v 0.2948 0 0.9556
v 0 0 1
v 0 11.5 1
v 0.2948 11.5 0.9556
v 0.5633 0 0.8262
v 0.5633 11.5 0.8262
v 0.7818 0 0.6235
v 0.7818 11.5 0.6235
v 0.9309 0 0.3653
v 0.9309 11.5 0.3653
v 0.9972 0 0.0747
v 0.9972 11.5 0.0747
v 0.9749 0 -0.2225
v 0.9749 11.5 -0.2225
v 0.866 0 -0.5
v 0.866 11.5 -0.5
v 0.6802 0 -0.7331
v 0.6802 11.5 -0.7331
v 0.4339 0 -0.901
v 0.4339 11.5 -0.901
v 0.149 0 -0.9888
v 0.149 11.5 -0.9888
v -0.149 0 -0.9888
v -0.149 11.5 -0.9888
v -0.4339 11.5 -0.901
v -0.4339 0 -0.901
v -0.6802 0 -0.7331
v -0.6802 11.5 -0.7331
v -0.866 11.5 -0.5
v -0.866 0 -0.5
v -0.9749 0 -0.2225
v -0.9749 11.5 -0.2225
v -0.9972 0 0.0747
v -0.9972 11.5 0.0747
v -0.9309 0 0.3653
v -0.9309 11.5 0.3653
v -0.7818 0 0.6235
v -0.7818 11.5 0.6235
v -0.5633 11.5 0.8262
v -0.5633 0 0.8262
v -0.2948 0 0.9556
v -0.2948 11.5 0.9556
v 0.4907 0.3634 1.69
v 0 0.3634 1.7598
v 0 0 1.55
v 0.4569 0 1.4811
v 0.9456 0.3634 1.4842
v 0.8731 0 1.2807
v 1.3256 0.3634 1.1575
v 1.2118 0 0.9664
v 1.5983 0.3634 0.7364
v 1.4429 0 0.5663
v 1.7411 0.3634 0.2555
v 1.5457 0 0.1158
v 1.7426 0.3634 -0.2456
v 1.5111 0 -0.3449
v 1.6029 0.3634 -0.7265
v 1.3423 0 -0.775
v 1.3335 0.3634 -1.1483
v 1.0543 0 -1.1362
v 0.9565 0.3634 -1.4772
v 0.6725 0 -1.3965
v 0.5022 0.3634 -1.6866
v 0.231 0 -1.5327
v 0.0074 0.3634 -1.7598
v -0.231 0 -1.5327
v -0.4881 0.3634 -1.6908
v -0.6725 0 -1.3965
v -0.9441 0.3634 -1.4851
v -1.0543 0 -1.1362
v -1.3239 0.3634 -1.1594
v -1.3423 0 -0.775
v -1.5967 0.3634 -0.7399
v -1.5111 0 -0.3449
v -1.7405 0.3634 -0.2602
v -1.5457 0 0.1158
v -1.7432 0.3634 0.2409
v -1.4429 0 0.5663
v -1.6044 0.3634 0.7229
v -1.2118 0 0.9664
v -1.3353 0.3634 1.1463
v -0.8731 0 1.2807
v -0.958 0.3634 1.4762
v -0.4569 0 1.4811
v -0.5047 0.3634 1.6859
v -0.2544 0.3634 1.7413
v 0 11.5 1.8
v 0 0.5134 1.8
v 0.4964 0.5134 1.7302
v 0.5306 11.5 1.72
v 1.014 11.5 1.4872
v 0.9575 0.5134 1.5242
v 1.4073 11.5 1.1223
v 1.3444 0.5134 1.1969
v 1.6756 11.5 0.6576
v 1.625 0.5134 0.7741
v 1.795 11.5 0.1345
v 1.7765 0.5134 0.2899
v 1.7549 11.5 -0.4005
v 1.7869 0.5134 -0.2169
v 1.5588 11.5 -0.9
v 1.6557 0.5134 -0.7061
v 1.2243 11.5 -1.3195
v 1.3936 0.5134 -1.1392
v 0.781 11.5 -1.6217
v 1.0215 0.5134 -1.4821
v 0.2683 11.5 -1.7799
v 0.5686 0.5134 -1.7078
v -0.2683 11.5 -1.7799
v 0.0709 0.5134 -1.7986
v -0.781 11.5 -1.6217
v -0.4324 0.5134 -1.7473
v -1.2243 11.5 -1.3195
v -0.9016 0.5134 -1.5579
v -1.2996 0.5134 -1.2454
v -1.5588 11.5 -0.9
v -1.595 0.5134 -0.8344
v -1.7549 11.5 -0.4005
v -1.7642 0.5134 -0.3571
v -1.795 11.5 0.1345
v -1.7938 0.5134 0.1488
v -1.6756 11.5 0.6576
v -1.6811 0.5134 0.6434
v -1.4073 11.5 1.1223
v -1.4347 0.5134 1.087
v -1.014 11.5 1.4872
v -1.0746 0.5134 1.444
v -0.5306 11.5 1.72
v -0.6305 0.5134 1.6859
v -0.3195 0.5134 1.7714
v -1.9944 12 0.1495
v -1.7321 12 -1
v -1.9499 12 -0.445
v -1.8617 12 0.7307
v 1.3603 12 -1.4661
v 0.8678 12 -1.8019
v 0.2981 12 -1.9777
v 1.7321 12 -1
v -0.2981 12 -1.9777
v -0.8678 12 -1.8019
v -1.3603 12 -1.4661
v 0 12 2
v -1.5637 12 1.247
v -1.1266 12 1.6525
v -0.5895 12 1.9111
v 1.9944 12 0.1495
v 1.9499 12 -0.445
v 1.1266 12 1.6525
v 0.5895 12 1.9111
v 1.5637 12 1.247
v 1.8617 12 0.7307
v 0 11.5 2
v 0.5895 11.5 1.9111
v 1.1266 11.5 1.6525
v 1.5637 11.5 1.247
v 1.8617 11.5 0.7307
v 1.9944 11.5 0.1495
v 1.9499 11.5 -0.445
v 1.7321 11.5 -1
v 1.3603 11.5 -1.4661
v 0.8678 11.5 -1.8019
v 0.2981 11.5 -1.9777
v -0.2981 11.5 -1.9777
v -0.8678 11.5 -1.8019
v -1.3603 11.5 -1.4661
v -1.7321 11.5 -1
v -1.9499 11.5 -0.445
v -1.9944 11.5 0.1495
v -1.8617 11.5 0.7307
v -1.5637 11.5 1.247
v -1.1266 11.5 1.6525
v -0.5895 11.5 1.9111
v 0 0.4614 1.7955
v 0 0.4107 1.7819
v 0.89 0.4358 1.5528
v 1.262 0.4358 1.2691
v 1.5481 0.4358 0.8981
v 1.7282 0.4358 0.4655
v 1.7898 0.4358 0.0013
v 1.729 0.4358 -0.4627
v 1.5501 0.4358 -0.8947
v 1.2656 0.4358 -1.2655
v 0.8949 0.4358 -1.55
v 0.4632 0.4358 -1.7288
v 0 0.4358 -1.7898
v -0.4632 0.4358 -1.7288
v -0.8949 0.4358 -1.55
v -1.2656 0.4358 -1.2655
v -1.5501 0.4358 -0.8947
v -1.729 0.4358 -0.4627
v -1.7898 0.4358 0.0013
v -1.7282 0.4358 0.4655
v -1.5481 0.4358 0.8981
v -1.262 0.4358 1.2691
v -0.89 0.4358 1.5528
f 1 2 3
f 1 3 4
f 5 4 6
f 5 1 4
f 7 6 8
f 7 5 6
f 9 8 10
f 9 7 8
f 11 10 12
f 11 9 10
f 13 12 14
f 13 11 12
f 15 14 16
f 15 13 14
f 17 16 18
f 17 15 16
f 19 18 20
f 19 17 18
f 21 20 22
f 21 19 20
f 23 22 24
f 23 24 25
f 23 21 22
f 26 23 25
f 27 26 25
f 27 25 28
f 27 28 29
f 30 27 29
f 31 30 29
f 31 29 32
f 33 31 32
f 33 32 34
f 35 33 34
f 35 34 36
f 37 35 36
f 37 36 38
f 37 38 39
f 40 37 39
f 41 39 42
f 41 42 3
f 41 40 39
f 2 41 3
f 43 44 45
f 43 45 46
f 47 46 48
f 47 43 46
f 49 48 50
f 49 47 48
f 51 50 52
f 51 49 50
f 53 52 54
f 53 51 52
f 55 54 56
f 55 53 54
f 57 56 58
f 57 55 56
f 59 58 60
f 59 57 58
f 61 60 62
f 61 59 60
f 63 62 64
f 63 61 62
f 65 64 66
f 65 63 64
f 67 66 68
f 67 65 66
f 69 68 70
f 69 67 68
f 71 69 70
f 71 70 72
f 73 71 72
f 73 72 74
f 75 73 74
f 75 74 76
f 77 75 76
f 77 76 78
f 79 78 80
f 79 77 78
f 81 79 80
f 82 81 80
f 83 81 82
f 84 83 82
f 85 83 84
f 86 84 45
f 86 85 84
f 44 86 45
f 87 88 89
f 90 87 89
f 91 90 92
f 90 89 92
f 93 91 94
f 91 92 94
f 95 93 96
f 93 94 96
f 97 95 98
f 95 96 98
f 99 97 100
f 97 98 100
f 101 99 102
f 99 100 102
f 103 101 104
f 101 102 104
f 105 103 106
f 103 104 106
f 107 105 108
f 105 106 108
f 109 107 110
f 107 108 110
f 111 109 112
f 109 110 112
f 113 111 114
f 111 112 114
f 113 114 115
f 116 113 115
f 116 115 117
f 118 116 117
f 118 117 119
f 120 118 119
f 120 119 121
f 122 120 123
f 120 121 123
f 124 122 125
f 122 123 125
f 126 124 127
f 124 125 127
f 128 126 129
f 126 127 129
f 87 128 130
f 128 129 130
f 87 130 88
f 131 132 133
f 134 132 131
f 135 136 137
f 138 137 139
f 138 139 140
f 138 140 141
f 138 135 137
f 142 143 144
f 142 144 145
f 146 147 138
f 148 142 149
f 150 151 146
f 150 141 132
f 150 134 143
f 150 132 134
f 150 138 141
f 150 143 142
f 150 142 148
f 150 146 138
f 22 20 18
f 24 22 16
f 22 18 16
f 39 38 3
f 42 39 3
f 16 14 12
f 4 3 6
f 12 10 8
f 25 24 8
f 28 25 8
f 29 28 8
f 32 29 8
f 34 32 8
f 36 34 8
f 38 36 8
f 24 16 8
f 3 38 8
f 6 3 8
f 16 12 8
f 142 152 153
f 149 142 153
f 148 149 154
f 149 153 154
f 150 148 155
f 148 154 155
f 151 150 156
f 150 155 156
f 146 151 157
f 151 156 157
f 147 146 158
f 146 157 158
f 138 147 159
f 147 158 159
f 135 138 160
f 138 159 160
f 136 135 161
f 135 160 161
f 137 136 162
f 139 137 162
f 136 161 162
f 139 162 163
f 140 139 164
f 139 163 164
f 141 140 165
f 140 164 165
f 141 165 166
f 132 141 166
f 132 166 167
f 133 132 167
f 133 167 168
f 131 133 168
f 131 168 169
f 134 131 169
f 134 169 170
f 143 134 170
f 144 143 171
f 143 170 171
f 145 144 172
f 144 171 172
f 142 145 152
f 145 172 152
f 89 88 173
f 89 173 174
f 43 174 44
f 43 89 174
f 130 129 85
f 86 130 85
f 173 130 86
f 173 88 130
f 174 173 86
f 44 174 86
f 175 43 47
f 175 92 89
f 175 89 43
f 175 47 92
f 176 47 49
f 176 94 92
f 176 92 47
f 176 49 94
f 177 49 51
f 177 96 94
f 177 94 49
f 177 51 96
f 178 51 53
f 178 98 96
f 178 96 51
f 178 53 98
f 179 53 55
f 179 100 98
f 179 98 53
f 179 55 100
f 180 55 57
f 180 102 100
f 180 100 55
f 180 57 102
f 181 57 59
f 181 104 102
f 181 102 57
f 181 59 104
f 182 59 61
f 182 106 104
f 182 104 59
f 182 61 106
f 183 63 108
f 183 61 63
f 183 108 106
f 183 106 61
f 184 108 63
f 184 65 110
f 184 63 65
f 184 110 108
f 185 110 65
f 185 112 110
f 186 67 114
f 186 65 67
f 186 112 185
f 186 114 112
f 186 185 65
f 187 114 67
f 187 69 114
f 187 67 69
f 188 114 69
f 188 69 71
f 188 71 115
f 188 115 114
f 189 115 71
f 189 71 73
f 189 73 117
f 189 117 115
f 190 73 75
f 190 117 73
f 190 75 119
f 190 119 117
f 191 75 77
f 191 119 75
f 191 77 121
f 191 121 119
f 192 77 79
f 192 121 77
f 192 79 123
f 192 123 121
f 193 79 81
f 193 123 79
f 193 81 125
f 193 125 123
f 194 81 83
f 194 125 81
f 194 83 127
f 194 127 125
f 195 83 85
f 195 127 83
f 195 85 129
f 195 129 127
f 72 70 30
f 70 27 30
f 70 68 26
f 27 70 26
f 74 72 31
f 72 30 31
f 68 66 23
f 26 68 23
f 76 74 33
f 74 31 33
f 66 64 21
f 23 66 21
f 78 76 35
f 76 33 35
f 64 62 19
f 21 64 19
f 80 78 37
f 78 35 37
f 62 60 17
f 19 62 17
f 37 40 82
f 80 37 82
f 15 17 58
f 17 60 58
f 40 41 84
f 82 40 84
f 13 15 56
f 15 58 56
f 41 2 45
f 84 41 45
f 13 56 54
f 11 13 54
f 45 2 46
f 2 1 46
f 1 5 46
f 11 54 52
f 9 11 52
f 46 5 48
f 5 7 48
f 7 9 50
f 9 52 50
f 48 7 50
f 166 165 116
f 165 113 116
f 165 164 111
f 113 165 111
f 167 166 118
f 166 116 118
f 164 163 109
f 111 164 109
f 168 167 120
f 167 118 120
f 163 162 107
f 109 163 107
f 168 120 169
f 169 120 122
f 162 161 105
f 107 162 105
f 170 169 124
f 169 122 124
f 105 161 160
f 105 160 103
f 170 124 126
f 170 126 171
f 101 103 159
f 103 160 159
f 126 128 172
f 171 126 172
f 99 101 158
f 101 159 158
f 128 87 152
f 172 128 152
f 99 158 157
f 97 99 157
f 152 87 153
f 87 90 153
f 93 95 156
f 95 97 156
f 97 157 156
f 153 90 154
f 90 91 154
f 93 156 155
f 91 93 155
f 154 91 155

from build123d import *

# Parameters (mm, degrees)
SKETCH1_R           = 1.8
SKETCH1_R_2         = 1
BOSS_EXTRUDE1_DEPTH = 11.5
SKETCH2_R           = 2
BOSS_EXTRUDE2_DEPTH = 0.5
CHAMFER1_SIZE       = 0.25
CHAMFER1_SIZE2      = 0.433012702
FILLET1_R           = 0.3


with BuildPart() as part:
    # Sketch1 → Boss-Extrude1 (new body)
    with BuildSketch(Plane(origin=(0, 0, 0), x_dir=(1, 0, 0), z_dir=(0, 1, 0))):
        with Locations(Location((0, 0, 0), (0, 0, 270))):
            Circle(SKETCH1_R)
        with Locations(Location((0, 0, 0), (0, 0, 270))):
            Circle(SKETCH1_R_2, mode=Mode.SUBTRACT)
    extrude(amount=BOSS_EXTRUDE1_DEPTH)

    # Sketch2 → Boss-Extrude2 (add)
    with BuildSketch(Plane(origin=(0, 11.5, 0), x_dir=(1, 0, 0), z_dir=(0, 1, 0))):
        with Locations(Location((0, 0, 0), (0, 0, 270))):
            Circle(SKETCH2_R)
    extrude(amount=BOSS_EXTRUDE2_DEPTH)

    # Chamfer1
    chamfer1_edges = [part.edges().sort_by_distance(p)[0] for p in [
        (0, 0, -1.8),
    ]]
    chamfer1_side = [part.faces().sort_by_distance(p)[0] for p in [
        (0, 0, -1.749088312),
    ]]
    chamfer(chamfer1_edges, length=CHAMFER1_SIZE, length2=CHAMFER1_SIZE2, reference=chamfer1_side[0])

    # Fillet1
    fillet1_edges = [part.edges().sort_by_distance(p)[0] for p in [
        (0, 0.433012702, -1.8),
    ]]
    fillet(fillet1_edges, radius=FILLET1_R)


solid = part.part
